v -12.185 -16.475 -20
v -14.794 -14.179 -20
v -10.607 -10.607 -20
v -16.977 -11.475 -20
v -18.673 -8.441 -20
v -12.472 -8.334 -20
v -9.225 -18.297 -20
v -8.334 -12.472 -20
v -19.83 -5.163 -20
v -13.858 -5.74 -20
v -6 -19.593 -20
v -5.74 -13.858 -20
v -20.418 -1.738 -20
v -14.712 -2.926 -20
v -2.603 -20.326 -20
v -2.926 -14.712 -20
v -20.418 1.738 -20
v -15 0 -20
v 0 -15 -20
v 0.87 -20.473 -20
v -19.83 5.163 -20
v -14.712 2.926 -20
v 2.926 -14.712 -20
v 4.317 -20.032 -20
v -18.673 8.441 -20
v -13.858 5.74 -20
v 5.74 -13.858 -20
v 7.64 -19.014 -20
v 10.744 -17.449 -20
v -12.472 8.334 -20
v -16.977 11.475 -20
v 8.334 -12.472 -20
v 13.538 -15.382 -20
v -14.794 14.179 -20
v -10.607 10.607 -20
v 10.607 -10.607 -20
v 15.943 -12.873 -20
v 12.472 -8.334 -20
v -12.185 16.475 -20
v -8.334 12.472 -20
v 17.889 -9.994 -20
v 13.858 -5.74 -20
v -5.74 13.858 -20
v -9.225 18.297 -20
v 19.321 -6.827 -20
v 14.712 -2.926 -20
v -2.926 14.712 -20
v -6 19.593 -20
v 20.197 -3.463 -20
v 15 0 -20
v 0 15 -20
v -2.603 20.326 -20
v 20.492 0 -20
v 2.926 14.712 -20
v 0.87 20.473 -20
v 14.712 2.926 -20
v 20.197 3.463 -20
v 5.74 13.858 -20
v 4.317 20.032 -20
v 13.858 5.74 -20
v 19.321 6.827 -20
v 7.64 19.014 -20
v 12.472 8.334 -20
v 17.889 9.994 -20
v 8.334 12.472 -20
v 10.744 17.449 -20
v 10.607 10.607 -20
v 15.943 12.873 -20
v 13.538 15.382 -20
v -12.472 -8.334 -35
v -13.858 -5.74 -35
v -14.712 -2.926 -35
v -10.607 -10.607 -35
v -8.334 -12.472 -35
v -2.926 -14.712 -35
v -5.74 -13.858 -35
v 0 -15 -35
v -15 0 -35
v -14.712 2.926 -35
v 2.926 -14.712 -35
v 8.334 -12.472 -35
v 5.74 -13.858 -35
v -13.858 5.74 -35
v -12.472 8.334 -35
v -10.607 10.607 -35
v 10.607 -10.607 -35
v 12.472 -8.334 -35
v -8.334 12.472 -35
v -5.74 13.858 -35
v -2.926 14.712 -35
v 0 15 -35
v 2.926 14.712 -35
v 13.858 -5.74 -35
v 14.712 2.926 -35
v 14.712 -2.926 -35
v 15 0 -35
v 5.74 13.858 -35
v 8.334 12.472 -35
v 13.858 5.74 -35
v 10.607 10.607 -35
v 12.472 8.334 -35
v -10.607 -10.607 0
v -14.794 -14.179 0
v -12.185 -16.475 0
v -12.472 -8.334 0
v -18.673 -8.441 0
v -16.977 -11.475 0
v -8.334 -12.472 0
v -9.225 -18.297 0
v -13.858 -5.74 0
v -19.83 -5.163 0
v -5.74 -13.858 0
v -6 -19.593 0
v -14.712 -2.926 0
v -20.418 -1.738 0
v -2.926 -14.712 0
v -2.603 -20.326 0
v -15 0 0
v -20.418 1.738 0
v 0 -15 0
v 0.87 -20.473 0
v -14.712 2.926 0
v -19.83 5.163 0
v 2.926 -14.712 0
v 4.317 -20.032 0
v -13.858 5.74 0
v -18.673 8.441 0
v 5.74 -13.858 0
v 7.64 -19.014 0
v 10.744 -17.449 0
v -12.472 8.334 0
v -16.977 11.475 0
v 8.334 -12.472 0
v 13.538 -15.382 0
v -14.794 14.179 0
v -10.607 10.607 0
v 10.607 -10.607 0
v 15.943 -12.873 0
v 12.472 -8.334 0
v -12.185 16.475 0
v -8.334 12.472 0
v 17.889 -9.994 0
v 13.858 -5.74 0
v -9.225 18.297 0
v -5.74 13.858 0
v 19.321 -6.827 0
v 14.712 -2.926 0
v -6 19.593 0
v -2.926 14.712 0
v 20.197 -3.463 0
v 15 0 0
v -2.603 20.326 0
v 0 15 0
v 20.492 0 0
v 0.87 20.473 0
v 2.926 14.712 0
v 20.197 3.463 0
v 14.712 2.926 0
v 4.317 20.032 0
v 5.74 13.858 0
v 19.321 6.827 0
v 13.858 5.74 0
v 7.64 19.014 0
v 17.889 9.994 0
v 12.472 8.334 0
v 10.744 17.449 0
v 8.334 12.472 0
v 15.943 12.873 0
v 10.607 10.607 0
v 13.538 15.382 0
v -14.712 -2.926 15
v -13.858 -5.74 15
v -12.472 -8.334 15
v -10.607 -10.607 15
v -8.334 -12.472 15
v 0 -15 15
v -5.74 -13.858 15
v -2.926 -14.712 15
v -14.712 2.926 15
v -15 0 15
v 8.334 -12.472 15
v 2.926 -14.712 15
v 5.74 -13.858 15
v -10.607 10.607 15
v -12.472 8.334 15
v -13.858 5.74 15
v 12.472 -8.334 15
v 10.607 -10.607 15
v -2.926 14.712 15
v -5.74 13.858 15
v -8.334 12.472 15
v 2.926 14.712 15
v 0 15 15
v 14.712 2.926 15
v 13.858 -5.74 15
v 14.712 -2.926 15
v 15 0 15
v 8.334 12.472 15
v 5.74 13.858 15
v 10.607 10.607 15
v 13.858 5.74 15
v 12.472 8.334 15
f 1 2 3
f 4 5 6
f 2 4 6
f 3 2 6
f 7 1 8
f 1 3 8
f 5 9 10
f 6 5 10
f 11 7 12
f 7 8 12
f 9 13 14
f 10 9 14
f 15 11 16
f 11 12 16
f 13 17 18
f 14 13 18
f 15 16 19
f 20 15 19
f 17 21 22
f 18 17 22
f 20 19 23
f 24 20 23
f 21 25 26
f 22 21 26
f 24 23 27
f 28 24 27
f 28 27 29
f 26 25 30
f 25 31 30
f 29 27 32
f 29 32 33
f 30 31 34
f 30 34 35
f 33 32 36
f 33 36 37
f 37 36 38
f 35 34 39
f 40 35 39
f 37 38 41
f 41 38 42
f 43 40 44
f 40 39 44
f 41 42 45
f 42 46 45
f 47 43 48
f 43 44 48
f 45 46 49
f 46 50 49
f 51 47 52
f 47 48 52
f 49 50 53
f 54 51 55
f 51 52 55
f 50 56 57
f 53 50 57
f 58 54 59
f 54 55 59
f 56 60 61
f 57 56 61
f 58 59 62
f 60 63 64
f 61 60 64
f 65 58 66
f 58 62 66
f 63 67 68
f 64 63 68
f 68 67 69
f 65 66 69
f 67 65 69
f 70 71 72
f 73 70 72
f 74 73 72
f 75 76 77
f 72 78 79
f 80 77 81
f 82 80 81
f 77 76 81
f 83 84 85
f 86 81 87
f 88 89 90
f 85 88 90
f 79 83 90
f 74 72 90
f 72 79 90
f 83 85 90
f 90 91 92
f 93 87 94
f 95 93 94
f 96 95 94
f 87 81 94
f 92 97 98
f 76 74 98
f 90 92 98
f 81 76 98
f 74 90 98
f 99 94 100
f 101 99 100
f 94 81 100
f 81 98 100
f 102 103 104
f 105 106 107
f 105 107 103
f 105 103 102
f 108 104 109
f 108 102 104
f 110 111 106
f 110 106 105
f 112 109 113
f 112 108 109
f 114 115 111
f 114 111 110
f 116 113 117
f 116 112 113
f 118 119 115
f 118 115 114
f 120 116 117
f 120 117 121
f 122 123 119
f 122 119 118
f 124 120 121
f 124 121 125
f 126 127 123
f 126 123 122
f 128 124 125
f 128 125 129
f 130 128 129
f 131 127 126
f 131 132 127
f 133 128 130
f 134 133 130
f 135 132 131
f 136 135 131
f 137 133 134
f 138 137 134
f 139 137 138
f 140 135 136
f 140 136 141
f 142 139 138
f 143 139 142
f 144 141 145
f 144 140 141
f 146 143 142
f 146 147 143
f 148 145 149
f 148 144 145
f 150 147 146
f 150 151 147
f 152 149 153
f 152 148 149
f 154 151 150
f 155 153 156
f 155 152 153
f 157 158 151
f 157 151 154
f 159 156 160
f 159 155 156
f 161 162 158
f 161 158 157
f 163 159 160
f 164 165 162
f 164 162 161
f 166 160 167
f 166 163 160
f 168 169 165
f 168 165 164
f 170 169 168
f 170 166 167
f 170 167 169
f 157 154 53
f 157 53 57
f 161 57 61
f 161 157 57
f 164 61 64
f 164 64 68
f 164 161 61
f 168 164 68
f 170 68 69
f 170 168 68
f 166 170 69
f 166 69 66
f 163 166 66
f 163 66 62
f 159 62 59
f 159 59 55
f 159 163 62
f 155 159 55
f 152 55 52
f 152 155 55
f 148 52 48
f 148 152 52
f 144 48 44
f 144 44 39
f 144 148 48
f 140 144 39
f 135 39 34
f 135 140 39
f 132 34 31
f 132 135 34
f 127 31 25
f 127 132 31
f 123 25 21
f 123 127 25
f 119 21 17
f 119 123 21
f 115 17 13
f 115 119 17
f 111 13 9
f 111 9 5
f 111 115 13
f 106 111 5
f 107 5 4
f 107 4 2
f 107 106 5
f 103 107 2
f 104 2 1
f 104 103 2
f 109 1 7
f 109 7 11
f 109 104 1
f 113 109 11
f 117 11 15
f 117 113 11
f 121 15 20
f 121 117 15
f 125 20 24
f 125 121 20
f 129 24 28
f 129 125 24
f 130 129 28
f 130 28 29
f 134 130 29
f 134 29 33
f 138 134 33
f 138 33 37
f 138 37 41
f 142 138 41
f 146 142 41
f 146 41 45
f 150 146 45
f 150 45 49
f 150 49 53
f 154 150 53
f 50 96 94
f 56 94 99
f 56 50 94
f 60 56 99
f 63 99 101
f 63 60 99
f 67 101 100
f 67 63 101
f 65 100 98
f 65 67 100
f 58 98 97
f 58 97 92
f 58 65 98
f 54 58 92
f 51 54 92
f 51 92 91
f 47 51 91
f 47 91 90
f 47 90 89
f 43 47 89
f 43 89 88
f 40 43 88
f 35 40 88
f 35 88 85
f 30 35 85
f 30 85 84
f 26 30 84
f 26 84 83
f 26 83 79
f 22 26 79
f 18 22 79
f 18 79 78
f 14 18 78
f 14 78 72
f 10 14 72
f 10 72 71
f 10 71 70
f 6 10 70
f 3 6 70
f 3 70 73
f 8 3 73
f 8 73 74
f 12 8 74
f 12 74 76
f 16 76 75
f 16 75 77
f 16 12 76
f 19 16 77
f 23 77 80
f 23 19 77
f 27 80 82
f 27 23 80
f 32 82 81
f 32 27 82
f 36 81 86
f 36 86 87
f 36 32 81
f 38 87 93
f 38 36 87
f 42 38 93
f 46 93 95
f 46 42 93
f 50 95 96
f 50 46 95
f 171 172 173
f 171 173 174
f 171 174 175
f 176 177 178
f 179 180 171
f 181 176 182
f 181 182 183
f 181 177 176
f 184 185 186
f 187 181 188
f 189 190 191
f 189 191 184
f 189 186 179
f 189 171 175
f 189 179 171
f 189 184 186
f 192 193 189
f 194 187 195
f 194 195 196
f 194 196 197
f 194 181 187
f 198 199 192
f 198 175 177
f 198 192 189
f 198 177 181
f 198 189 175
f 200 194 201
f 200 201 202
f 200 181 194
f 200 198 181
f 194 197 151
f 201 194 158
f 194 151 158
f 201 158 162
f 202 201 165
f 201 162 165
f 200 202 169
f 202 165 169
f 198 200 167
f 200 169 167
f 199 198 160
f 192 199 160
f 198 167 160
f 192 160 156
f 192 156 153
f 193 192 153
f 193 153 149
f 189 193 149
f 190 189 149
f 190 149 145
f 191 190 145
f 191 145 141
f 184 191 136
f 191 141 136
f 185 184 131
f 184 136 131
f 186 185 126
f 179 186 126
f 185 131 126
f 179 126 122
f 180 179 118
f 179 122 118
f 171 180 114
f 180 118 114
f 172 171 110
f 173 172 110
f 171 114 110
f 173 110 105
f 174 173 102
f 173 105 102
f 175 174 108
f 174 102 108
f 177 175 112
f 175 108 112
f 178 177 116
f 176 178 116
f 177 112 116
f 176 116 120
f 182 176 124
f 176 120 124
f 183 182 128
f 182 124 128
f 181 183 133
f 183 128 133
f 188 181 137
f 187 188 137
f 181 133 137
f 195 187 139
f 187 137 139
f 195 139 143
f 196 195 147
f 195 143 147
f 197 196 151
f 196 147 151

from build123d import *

# Parameters (mm, degrees)
F0_R     = 15
F1_DEPTH = 15
F2_R     = 20.49161
F3_DEPTH = 20
F4_R     = 15
F5_DEPTH = 35


with BuildPart() as f1:
    # F0 (on Top) → F1 (new body)
    with BuildSketch(Plane.XY):
        Circle(F0_R)
    extrude(amount=F1_DEPTH)

    # F2 (on Top) → F3 (join)
    with BuildSketch(Plane.XY):
        Circle(F2_R)
    extrude(amount=-F3_DEPTH)

    # F4 (on Top) → F5 (join)
    with BuildSketch(Plane.XY):
        Circle(F4_R)
    extrude(amount=-F5_DEPTH)


solid = f1.part
